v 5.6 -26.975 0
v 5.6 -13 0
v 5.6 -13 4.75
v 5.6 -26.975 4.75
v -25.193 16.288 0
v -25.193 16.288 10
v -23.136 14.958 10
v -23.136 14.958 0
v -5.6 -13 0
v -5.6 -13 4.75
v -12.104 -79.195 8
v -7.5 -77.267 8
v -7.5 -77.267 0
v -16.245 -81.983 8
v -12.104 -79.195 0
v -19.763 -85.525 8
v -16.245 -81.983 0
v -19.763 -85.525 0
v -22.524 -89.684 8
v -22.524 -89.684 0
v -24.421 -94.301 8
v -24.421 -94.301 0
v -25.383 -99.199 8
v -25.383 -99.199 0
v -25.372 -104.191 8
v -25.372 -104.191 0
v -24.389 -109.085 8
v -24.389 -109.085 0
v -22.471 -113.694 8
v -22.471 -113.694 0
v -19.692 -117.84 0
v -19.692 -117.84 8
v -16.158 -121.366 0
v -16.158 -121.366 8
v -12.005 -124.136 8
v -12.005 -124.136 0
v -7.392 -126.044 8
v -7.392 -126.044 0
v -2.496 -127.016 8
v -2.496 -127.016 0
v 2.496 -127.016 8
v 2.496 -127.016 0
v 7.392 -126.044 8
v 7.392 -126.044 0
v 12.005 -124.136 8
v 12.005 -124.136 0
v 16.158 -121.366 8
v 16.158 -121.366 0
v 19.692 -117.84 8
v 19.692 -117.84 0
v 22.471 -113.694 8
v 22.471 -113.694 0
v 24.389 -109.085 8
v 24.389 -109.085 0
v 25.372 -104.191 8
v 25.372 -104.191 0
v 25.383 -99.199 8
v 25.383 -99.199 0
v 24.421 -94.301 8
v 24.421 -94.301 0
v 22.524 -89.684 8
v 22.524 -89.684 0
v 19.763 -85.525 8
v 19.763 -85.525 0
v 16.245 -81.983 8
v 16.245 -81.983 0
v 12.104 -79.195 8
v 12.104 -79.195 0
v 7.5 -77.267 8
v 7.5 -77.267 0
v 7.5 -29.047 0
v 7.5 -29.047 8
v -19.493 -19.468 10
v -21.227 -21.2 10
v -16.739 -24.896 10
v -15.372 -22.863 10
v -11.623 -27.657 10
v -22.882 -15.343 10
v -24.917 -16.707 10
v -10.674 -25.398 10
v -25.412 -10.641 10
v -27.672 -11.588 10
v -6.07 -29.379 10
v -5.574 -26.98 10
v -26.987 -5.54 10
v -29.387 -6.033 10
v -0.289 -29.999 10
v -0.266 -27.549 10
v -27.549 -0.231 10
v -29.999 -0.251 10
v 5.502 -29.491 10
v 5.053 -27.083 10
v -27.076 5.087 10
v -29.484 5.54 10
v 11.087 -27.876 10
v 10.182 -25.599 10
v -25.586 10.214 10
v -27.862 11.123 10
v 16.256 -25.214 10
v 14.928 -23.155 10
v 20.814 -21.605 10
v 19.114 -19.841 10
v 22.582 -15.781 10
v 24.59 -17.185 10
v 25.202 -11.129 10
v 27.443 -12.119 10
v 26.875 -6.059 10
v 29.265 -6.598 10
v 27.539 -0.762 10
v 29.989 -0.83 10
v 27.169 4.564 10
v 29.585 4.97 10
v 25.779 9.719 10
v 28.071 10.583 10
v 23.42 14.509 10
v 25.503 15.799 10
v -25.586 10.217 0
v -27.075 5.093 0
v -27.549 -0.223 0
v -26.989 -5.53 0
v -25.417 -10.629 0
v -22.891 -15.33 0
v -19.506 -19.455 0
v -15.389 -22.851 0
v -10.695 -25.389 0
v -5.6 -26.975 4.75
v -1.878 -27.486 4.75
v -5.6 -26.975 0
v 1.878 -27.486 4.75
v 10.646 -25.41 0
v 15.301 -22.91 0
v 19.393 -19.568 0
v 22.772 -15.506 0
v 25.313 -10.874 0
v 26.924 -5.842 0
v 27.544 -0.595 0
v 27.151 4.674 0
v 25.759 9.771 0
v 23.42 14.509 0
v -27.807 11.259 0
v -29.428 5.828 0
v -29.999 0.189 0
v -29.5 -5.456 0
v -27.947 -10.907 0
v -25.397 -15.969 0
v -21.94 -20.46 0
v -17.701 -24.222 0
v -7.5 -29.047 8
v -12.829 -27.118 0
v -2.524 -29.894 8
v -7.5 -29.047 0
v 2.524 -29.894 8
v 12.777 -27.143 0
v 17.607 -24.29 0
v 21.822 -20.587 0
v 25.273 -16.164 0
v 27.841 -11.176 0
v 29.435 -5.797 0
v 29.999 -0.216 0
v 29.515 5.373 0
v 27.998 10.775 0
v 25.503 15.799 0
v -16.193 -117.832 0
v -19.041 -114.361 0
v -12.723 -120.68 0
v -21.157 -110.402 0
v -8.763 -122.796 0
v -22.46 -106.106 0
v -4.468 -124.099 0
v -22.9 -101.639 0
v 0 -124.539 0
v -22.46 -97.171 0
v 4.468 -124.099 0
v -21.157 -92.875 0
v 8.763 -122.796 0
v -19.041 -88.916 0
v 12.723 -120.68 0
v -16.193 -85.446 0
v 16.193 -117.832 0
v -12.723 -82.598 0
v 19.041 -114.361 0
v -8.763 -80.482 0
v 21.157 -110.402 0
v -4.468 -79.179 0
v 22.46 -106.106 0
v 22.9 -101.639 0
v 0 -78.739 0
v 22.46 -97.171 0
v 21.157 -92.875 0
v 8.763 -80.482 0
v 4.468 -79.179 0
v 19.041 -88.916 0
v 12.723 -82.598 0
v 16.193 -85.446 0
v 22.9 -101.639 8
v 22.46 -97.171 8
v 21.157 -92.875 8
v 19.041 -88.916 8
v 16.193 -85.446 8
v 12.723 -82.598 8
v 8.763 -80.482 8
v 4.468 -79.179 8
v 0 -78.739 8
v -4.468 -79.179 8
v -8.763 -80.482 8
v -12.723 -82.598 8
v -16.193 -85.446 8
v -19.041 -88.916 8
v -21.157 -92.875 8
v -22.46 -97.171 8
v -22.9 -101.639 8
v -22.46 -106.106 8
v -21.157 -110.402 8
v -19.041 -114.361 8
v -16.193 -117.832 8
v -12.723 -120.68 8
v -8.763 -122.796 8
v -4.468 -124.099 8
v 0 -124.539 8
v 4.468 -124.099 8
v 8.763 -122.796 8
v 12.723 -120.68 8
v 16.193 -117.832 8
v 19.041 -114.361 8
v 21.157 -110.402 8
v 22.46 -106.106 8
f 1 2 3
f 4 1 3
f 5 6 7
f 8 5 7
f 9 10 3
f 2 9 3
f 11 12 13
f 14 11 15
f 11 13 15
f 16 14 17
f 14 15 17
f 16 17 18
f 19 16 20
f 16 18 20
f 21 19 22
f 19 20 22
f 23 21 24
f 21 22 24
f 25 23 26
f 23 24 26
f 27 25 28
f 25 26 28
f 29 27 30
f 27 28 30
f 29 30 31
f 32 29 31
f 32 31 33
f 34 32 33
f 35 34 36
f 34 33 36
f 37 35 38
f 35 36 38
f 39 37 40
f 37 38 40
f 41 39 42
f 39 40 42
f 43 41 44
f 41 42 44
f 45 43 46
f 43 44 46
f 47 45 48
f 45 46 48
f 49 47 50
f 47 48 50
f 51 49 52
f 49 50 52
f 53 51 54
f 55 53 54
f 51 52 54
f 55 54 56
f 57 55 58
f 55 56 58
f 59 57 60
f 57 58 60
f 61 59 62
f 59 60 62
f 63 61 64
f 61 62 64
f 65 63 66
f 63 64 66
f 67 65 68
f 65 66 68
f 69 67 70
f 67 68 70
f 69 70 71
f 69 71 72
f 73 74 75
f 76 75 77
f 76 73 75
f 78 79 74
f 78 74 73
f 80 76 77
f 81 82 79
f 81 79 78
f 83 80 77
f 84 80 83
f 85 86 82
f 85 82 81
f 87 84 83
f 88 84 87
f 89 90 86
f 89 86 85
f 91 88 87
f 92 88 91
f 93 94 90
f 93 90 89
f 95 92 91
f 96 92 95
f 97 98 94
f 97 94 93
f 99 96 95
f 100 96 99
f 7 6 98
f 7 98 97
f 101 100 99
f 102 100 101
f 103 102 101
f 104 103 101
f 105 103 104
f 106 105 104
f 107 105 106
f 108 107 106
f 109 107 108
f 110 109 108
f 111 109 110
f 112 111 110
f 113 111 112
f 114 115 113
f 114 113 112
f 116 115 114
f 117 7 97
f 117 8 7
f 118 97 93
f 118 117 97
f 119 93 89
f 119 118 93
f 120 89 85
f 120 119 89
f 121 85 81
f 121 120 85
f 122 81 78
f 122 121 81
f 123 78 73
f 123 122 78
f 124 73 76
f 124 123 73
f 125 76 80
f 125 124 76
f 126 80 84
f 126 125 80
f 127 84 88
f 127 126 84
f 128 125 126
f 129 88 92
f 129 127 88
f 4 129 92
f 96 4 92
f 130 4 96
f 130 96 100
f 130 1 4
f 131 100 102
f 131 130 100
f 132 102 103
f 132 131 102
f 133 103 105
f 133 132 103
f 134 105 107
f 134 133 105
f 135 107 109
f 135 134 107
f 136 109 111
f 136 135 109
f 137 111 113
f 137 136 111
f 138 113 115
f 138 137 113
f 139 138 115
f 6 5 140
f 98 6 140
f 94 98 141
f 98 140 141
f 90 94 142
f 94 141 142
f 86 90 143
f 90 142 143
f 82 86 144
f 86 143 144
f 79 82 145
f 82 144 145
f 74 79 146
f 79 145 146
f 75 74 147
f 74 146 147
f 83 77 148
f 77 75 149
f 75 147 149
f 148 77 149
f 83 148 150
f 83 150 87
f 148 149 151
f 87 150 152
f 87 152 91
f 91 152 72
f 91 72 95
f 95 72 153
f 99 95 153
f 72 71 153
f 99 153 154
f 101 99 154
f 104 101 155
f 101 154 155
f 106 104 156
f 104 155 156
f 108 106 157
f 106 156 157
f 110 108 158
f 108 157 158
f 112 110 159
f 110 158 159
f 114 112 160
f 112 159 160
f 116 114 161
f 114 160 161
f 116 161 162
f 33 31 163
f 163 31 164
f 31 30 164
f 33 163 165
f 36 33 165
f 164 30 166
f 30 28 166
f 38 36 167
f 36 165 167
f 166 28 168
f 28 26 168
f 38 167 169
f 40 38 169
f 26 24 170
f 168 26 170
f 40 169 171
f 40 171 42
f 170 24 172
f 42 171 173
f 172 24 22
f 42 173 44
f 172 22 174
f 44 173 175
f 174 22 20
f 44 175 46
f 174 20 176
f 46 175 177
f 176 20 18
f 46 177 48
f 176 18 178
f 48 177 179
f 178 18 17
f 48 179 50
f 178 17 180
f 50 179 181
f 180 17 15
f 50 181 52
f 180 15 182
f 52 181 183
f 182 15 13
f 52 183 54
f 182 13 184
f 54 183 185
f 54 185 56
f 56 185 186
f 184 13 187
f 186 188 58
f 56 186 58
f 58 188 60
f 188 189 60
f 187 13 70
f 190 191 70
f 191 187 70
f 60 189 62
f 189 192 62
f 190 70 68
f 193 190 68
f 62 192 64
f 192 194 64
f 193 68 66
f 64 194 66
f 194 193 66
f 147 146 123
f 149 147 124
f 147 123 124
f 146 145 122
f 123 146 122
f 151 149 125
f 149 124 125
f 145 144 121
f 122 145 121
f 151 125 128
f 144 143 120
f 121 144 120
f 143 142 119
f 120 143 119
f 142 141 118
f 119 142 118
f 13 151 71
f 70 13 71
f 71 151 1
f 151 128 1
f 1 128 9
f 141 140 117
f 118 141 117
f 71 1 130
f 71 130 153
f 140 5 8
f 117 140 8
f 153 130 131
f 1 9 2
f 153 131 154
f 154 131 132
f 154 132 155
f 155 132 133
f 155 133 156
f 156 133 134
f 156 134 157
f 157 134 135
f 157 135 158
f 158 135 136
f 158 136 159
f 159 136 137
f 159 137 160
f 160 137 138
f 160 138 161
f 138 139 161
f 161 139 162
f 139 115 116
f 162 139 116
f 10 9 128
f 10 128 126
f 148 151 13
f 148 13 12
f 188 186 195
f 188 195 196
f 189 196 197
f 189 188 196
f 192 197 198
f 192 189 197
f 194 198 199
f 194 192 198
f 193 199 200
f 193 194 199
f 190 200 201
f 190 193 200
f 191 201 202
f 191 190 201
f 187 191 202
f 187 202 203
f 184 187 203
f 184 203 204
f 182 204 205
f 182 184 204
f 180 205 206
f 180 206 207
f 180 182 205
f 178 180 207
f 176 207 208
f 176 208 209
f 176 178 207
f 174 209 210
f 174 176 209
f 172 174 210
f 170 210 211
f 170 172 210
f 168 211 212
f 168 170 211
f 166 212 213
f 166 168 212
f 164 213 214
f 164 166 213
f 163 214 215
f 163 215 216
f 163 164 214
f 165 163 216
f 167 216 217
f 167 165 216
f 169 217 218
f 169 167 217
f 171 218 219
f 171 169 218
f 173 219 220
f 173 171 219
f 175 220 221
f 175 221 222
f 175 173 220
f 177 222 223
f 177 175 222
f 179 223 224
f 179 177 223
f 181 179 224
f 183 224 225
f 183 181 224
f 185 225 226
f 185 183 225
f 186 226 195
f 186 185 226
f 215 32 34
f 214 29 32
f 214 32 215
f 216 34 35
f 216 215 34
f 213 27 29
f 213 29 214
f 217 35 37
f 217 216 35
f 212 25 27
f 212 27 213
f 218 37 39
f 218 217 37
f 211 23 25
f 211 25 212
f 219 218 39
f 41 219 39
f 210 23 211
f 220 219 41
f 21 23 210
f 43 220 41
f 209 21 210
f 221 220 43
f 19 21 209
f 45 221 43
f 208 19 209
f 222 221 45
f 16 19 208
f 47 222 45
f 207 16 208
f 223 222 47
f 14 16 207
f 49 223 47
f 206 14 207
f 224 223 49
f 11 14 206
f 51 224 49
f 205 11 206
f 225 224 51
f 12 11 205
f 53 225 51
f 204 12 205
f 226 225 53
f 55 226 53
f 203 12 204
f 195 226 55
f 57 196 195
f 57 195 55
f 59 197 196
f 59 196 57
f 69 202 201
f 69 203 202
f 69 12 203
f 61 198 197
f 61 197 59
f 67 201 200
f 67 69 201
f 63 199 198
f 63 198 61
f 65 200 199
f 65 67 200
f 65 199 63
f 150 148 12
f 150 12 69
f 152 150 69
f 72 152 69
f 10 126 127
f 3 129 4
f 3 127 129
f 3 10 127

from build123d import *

# Parameters (mm, degrees)
SKETCH_R      = 30
SKETCH_R_2    = 27.55
PAD_DEPTH     = 10
POCKET_DEPTH  = 10
SKETCH002_W   = 11.2
SKETCH002_H   = 4.75
PAD001_DEPTH  = 15
SKETCH003_W   = 15
SKETCH003_H   = 8
PAD002_DEPTH  = 50
SKETCH004_R   = 25.5
SKETCH004_R_2 = 22.9
PAD003_DEPTH  = 8


with BuildPart() as body:
    # Sketch → Pad (new body)
    with BuildSketch(Plane.XY):
        Circle(SKETCH_R)
        Circle(SKETCH_R_2, mode=Mode.SUBTRACT)
    extrude(amount=PAD_DEPTH)

    # Sketch001 (on Face4 of Pad) → Pocket (cut)
    with BuildSketch(Plane.XY.offset(10)):
        with BuildLine():
            ThreePointArc((33.724741, 20.89253), (0.382596, 39.670008), (-33.31551, 21.539098))
            Line((-33.31551, 21.539098), (0, 0))
            Line((0, 0), (33.724741, 20.89253))
        make_face()
    extrude(amount=-POCKET_DEPTH, mode=Mode.SUBTRACT)


with BuildPart() as fusion:
    # Sketch002 → Pad001 (new body)
    with BuildSketch(Plane.XZ.offset(20)):
        with Locations((0, 2.375)):
            Rectangle(SKETCH002_W, SKETCH002_H)
    extrude(amount=PAD001_DEPTH)


with BuildPart() as fusion_1:
    # Body001 placement: moved
    add(fusion.part.moved(Location((0, 7, 0))))

    # Fusion: union Body
    add(body.part)


with BuildPart() as fusion001:
    # Sketch003 (on Body) → Pad002 (new body)
    with BuildSketch(Plane.XZ.offset(-7)):
        with Locations((0, 4)):
            Rectangle(SKETCH003_W, SKETCH003_H)
    extrude(amount=PAD002_DEPTH)


with BuildPart() as fusion001_1:
    # Body002 placement: moved
    add(fusion001.part.moved(Location((0, -35.2, 0))))

    # Fusion001: union Fusion
    add(fusion_1.part)


with BuildPart() as fusion002:
    # Sketch004 → Pad003 (new body)
    with BuildSketch(Plane.XY):
        with Locations((0, -84.238922)):
            Circle(SKETCH004_R)
        with Locations((0, -84.238922)):
            Circle(SKETCH004_R_2, mode=Mode.SUBTRACT)
    extrude(amount=PAD003_DEPTH)


with BuildPart() as fusion002_1:
    # Body003 placement: moved
    add(fusion002.part.moved(Location((0, -17.4, 0))))

    # Fusion002: union Fusion001
    add(fusion001_1.part)


solid = fusion002_1.part
